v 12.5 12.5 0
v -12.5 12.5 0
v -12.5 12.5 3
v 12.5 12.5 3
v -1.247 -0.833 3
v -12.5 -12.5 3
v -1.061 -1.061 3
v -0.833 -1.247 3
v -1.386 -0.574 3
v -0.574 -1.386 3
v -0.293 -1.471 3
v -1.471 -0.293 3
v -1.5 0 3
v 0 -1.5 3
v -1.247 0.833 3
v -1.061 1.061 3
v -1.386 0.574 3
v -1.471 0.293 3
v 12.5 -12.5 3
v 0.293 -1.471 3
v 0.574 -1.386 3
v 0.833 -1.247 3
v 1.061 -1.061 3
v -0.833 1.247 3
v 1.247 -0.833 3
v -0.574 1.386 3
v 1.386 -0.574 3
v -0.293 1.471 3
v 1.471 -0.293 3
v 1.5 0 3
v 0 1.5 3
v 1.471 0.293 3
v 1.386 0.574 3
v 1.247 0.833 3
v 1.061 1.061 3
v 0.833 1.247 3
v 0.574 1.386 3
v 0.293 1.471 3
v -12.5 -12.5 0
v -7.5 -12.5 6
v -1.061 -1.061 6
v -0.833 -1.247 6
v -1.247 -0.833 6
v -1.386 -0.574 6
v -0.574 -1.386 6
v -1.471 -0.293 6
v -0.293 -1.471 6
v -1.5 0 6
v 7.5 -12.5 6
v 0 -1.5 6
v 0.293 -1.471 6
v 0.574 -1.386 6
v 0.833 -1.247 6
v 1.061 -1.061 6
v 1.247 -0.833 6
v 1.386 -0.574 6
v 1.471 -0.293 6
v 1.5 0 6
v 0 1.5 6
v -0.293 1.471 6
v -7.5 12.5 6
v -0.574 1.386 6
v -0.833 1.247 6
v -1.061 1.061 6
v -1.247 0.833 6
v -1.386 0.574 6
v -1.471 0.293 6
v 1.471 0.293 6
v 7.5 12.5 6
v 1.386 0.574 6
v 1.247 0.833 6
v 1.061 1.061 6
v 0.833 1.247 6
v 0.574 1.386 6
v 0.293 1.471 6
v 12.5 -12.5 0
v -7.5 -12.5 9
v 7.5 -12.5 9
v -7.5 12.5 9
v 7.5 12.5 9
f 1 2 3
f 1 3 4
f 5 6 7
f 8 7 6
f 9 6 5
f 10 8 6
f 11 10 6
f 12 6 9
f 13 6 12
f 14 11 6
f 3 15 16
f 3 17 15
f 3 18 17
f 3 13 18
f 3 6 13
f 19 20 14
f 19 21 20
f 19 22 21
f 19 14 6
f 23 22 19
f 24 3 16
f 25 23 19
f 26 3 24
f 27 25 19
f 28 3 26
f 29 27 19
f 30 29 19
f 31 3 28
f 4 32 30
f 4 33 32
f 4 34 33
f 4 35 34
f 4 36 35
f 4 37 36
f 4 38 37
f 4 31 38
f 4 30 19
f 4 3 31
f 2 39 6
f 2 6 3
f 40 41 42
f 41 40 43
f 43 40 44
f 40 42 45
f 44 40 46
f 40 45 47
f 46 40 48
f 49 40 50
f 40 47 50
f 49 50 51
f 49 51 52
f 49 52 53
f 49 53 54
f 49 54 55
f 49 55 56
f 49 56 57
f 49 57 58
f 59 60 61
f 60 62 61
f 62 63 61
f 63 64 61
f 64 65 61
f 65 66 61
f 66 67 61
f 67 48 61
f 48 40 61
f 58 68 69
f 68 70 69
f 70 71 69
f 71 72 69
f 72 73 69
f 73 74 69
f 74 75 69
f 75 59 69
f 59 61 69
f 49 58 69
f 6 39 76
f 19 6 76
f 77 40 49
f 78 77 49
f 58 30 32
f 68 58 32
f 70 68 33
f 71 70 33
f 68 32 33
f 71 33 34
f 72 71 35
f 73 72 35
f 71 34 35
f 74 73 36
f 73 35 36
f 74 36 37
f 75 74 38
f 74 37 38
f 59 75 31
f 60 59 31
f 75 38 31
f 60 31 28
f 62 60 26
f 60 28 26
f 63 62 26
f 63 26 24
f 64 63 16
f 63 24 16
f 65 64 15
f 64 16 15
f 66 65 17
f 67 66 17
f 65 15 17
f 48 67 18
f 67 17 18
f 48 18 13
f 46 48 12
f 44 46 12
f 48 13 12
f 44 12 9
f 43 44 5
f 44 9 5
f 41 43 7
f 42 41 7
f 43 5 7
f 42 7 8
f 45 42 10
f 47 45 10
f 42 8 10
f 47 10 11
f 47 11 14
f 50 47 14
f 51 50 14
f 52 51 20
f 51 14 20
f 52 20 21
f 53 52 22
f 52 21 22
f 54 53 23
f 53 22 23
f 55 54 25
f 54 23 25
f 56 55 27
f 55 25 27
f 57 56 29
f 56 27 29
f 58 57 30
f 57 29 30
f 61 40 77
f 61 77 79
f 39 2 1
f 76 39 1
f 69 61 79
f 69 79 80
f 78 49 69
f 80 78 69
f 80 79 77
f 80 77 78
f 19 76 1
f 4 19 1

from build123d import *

# Parameters (mm, degrees)
SKETCH2_W           = 25
SKETCH2_H           = 25
BOSS_EXTRUDE2_DEPTH = 3
SKETCH3_R           = 1.5
BOSS_EXTRUDE3_DEPTH = 3
SKETCH4_W           = 15
SKETCH4_H           = 25
BOSS_EXTRUDE4_DEPTH = 3


with BuildPart() as part:
    # Sketch2 → Boss-Extrude2 (new body)
    with BuildSketch(Plane.XY):
        Rectangle(SKETCH2_W, SKETCH2_H)
    extrude(amount=BOSS_EXTRUDE2_DEPTH)

    # Sketch3 → Boss-Extrude3 (add)
    with BuildSketch(Plane.XY.offset(3)):
        Circle(SKETCH3_R)
    extrude(amount=BOSS_EXTRUDE3_DEPTH)

    # Sketch4 → Boss-Extrude4 (add)
    with BuildSketch(Plane.XY.offset(6)):
        Rectangle(SKETCH4_W, SKETCH4_H)
    extrude(amount=BOSS_EXTRUDE4_DEPTH)


solid = part.part
